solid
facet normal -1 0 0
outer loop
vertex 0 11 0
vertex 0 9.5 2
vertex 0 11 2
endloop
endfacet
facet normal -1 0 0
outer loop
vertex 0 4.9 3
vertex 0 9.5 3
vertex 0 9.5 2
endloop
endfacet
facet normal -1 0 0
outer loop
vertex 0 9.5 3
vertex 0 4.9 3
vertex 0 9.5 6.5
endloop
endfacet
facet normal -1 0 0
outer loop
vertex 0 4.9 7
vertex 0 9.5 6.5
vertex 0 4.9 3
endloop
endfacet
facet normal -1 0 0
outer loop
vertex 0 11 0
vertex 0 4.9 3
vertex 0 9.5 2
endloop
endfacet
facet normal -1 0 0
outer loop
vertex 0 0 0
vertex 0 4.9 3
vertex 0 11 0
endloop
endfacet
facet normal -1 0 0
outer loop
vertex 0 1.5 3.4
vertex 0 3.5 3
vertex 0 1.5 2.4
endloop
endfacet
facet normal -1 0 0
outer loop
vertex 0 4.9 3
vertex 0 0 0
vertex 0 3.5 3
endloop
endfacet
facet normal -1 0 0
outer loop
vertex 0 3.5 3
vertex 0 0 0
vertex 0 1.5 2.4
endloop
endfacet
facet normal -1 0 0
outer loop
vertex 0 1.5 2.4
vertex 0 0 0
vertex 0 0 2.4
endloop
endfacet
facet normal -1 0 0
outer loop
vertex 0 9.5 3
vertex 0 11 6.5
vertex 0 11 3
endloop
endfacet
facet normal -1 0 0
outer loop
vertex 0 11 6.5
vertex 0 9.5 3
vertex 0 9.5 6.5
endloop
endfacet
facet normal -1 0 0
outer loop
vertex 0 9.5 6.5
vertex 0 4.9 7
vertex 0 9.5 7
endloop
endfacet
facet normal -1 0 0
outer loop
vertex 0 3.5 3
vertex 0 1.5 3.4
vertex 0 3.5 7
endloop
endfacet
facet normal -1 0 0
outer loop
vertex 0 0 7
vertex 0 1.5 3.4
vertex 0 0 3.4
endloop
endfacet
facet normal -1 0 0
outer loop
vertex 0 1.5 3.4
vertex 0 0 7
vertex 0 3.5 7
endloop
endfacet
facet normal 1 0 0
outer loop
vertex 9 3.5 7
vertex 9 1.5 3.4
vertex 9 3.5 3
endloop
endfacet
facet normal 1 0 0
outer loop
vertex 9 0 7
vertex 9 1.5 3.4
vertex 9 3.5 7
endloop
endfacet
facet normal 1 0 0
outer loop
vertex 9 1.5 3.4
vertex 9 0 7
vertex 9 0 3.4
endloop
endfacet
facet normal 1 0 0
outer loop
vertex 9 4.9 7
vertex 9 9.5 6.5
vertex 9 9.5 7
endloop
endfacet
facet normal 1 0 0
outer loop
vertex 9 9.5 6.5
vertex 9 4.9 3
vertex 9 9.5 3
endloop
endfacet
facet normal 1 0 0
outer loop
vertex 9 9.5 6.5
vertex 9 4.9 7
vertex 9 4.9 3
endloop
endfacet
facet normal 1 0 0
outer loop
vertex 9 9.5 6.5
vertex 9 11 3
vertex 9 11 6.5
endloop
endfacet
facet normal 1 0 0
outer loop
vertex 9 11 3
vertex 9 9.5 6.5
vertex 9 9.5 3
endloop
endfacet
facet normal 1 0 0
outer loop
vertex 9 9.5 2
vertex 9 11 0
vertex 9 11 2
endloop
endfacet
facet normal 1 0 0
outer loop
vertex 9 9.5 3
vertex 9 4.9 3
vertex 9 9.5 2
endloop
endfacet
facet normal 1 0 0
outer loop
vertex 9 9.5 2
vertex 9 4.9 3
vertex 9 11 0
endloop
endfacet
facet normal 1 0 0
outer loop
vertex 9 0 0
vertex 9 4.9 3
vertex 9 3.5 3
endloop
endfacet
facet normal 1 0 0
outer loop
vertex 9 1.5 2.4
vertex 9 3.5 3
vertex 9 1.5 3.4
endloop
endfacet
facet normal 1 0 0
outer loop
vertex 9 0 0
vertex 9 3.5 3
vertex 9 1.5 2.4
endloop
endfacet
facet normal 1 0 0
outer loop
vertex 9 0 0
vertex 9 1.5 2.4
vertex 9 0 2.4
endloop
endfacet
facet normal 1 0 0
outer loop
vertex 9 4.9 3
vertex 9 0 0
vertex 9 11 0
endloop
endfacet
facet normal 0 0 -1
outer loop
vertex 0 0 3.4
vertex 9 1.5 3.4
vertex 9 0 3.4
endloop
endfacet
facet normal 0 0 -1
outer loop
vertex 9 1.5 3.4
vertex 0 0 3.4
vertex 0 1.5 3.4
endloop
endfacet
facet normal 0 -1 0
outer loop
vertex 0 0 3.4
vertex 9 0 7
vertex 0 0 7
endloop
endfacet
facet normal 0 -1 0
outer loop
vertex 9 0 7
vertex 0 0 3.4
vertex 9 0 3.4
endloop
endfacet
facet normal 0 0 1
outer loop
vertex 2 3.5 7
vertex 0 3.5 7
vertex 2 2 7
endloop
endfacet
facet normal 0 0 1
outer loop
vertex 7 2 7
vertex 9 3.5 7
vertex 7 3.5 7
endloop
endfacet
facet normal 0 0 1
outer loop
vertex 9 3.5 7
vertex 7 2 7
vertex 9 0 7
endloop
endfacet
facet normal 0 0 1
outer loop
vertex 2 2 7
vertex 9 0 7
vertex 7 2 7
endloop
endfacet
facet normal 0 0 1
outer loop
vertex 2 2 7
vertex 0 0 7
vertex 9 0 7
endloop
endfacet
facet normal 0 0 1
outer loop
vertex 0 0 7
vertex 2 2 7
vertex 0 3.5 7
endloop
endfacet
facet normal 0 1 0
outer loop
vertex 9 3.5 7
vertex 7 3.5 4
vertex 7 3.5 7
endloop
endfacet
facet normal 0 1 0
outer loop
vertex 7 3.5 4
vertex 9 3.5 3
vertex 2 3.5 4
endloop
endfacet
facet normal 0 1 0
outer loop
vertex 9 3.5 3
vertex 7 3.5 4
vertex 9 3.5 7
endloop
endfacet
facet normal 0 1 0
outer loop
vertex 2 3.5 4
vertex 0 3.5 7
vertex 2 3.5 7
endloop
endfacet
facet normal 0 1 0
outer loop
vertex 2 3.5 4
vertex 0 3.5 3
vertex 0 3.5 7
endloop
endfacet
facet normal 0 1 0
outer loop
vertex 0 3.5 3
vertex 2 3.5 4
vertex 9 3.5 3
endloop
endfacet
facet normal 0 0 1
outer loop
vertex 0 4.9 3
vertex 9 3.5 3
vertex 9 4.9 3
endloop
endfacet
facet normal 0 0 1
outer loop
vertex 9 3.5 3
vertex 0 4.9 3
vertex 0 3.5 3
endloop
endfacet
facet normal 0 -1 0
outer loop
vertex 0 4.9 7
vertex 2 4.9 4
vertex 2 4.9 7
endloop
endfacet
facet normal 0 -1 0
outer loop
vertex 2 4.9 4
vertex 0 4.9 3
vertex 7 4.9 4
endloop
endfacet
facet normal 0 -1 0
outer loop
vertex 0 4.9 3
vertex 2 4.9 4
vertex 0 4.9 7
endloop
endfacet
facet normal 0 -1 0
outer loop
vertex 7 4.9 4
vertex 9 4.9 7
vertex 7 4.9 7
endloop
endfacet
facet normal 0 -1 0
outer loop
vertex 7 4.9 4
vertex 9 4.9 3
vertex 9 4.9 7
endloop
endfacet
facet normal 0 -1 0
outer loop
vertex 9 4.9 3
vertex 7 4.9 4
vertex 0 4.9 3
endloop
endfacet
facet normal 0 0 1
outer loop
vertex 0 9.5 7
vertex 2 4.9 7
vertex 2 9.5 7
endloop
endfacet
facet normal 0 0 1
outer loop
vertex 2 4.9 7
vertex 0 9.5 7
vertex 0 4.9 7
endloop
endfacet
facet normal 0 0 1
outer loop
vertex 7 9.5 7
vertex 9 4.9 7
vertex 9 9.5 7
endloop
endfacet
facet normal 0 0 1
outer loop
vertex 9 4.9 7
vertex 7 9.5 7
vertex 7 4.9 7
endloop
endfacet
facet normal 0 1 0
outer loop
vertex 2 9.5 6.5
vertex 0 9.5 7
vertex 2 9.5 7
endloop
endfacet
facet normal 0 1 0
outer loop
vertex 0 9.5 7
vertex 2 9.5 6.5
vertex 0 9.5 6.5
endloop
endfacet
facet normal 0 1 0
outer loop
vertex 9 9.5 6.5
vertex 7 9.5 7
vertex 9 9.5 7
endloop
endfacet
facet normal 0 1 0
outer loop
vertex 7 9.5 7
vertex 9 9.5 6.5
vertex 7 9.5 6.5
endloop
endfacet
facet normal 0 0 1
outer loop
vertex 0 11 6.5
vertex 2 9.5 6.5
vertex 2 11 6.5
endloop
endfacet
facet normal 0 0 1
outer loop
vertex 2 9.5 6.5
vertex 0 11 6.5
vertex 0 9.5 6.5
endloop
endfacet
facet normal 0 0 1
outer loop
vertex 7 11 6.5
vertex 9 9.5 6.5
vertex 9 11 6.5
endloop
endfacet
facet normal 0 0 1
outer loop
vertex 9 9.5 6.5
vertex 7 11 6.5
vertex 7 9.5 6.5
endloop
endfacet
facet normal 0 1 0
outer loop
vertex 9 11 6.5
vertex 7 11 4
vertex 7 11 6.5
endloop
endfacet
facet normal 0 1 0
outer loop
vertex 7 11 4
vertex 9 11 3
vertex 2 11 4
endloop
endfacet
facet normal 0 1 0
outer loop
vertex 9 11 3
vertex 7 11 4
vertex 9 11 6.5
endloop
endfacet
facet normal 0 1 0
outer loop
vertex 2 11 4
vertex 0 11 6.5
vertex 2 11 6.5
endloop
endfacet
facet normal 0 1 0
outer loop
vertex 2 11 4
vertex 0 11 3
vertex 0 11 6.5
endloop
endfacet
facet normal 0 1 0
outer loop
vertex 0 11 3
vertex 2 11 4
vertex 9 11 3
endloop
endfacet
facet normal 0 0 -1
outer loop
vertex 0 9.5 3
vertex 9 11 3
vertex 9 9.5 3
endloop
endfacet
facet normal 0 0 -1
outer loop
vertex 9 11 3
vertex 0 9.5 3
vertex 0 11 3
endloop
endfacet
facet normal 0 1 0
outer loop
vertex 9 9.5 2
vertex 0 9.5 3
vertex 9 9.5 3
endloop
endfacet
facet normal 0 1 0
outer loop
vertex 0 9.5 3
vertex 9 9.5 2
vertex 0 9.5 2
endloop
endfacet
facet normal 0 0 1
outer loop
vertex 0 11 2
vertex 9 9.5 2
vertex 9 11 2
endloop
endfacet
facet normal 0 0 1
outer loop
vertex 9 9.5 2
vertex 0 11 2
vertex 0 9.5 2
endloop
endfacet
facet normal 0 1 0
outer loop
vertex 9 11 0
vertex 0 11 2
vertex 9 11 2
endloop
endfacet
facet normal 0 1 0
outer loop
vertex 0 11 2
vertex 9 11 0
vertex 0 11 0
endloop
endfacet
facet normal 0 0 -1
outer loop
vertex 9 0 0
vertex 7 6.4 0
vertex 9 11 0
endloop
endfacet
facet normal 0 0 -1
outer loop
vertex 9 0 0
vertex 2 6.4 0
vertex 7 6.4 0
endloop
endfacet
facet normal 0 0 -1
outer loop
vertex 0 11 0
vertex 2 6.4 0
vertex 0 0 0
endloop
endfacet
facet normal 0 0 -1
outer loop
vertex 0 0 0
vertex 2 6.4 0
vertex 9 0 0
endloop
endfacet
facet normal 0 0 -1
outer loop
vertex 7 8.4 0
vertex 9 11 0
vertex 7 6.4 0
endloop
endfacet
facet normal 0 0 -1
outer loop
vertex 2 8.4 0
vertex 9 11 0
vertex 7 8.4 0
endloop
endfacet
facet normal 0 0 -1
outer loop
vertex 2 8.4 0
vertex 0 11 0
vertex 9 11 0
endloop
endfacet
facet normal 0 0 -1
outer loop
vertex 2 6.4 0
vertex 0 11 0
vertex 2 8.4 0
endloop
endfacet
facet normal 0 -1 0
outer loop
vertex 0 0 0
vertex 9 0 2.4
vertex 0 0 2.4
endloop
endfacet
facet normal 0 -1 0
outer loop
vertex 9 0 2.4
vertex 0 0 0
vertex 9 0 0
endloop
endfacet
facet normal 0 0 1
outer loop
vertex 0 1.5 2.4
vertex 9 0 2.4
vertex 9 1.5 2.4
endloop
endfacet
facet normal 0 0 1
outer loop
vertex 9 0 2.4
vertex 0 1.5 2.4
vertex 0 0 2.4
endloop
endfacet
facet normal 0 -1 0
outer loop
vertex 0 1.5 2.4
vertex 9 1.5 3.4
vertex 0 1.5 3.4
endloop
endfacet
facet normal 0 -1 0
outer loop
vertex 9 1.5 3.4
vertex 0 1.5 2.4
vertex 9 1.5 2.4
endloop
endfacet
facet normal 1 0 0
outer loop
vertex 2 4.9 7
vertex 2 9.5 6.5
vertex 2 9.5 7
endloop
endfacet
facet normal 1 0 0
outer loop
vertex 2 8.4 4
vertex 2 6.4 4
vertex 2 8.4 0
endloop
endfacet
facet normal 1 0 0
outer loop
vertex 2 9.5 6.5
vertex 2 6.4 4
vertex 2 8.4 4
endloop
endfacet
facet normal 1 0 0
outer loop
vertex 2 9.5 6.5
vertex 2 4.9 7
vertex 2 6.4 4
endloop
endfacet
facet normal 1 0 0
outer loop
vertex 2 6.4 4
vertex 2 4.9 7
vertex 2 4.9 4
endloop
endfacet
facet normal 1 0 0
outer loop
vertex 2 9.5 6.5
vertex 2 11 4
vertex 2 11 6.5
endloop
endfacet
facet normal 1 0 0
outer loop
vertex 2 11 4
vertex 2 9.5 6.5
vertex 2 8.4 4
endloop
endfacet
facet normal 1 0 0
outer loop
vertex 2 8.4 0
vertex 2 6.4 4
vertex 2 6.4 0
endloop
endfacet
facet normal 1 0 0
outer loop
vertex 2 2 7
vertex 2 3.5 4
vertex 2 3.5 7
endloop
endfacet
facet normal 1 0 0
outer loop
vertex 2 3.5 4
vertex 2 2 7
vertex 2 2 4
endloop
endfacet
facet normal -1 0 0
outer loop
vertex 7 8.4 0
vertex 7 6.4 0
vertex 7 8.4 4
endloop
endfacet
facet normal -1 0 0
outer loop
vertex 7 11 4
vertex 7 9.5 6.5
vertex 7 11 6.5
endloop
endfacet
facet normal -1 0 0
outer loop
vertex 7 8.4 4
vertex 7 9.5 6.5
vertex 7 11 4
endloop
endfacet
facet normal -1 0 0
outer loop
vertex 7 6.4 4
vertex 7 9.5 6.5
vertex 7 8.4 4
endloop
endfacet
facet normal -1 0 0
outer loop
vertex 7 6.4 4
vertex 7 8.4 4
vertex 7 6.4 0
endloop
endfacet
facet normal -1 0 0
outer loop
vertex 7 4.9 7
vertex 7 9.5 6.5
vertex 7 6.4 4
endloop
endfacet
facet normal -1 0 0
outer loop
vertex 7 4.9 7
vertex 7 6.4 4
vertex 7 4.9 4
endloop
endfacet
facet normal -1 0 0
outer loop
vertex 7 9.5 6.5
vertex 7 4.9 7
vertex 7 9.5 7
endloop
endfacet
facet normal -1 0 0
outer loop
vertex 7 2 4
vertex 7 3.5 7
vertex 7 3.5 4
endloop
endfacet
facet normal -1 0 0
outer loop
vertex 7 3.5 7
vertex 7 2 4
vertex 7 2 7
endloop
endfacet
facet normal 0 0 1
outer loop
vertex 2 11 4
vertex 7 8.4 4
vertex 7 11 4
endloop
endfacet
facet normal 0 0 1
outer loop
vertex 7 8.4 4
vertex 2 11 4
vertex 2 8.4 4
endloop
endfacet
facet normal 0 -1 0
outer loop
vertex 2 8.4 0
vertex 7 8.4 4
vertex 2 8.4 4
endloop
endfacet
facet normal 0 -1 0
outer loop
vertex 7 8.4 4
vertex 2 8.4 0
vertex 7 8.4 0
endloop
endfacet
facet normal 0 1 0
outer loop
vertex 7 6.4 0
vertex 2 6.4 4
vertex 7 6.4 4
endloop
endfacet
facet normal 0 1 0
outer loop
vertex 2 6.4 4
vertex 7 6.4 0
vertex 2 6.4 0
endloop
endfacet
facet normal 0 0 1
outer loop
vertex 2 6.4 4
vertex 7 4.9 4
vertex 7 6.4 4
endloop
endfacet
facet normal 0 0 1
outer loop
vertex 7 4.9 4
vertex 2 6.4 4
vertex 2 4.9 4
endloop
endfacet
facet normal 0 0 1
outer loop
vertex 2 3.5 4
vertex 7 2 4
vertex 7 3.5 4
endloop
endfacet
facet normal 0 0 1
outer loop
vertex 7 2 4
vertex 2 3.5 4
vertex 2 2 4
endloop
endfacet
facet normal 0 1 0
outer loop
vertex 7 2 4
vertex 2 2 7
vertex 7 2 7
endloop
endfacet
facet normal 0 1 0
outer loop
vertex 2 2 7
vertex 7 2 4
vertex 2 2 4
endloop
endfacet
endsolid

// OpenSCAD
h=11;
t_pcb=1.4;
ypos=3.5;
w=9;
//mirror([0,-1,1])//preview
mirror([-1,0,1])//print
difference(){
	linear_extrude(w)difference(){
		square([7,h]);
		translate([3,ypos])square([10,t_pcb]);
		translate([2.4,0])square([1,1.5]);
		translate([2,h-1.5]){
			square([1,1.5]);
			translate([4.5,0])square(10);
		}
	}
	translate([0,0,(w-5)/2])linear_extrude(5){
		translate([3+1,ypos-1.5])square(10);
		translate([0,5+t_pcb])square([10,2]);
	}
}
	//translate([3+1,(10.5-5)/2,5-1.5])cube([10,5,5+1.2+3]);
